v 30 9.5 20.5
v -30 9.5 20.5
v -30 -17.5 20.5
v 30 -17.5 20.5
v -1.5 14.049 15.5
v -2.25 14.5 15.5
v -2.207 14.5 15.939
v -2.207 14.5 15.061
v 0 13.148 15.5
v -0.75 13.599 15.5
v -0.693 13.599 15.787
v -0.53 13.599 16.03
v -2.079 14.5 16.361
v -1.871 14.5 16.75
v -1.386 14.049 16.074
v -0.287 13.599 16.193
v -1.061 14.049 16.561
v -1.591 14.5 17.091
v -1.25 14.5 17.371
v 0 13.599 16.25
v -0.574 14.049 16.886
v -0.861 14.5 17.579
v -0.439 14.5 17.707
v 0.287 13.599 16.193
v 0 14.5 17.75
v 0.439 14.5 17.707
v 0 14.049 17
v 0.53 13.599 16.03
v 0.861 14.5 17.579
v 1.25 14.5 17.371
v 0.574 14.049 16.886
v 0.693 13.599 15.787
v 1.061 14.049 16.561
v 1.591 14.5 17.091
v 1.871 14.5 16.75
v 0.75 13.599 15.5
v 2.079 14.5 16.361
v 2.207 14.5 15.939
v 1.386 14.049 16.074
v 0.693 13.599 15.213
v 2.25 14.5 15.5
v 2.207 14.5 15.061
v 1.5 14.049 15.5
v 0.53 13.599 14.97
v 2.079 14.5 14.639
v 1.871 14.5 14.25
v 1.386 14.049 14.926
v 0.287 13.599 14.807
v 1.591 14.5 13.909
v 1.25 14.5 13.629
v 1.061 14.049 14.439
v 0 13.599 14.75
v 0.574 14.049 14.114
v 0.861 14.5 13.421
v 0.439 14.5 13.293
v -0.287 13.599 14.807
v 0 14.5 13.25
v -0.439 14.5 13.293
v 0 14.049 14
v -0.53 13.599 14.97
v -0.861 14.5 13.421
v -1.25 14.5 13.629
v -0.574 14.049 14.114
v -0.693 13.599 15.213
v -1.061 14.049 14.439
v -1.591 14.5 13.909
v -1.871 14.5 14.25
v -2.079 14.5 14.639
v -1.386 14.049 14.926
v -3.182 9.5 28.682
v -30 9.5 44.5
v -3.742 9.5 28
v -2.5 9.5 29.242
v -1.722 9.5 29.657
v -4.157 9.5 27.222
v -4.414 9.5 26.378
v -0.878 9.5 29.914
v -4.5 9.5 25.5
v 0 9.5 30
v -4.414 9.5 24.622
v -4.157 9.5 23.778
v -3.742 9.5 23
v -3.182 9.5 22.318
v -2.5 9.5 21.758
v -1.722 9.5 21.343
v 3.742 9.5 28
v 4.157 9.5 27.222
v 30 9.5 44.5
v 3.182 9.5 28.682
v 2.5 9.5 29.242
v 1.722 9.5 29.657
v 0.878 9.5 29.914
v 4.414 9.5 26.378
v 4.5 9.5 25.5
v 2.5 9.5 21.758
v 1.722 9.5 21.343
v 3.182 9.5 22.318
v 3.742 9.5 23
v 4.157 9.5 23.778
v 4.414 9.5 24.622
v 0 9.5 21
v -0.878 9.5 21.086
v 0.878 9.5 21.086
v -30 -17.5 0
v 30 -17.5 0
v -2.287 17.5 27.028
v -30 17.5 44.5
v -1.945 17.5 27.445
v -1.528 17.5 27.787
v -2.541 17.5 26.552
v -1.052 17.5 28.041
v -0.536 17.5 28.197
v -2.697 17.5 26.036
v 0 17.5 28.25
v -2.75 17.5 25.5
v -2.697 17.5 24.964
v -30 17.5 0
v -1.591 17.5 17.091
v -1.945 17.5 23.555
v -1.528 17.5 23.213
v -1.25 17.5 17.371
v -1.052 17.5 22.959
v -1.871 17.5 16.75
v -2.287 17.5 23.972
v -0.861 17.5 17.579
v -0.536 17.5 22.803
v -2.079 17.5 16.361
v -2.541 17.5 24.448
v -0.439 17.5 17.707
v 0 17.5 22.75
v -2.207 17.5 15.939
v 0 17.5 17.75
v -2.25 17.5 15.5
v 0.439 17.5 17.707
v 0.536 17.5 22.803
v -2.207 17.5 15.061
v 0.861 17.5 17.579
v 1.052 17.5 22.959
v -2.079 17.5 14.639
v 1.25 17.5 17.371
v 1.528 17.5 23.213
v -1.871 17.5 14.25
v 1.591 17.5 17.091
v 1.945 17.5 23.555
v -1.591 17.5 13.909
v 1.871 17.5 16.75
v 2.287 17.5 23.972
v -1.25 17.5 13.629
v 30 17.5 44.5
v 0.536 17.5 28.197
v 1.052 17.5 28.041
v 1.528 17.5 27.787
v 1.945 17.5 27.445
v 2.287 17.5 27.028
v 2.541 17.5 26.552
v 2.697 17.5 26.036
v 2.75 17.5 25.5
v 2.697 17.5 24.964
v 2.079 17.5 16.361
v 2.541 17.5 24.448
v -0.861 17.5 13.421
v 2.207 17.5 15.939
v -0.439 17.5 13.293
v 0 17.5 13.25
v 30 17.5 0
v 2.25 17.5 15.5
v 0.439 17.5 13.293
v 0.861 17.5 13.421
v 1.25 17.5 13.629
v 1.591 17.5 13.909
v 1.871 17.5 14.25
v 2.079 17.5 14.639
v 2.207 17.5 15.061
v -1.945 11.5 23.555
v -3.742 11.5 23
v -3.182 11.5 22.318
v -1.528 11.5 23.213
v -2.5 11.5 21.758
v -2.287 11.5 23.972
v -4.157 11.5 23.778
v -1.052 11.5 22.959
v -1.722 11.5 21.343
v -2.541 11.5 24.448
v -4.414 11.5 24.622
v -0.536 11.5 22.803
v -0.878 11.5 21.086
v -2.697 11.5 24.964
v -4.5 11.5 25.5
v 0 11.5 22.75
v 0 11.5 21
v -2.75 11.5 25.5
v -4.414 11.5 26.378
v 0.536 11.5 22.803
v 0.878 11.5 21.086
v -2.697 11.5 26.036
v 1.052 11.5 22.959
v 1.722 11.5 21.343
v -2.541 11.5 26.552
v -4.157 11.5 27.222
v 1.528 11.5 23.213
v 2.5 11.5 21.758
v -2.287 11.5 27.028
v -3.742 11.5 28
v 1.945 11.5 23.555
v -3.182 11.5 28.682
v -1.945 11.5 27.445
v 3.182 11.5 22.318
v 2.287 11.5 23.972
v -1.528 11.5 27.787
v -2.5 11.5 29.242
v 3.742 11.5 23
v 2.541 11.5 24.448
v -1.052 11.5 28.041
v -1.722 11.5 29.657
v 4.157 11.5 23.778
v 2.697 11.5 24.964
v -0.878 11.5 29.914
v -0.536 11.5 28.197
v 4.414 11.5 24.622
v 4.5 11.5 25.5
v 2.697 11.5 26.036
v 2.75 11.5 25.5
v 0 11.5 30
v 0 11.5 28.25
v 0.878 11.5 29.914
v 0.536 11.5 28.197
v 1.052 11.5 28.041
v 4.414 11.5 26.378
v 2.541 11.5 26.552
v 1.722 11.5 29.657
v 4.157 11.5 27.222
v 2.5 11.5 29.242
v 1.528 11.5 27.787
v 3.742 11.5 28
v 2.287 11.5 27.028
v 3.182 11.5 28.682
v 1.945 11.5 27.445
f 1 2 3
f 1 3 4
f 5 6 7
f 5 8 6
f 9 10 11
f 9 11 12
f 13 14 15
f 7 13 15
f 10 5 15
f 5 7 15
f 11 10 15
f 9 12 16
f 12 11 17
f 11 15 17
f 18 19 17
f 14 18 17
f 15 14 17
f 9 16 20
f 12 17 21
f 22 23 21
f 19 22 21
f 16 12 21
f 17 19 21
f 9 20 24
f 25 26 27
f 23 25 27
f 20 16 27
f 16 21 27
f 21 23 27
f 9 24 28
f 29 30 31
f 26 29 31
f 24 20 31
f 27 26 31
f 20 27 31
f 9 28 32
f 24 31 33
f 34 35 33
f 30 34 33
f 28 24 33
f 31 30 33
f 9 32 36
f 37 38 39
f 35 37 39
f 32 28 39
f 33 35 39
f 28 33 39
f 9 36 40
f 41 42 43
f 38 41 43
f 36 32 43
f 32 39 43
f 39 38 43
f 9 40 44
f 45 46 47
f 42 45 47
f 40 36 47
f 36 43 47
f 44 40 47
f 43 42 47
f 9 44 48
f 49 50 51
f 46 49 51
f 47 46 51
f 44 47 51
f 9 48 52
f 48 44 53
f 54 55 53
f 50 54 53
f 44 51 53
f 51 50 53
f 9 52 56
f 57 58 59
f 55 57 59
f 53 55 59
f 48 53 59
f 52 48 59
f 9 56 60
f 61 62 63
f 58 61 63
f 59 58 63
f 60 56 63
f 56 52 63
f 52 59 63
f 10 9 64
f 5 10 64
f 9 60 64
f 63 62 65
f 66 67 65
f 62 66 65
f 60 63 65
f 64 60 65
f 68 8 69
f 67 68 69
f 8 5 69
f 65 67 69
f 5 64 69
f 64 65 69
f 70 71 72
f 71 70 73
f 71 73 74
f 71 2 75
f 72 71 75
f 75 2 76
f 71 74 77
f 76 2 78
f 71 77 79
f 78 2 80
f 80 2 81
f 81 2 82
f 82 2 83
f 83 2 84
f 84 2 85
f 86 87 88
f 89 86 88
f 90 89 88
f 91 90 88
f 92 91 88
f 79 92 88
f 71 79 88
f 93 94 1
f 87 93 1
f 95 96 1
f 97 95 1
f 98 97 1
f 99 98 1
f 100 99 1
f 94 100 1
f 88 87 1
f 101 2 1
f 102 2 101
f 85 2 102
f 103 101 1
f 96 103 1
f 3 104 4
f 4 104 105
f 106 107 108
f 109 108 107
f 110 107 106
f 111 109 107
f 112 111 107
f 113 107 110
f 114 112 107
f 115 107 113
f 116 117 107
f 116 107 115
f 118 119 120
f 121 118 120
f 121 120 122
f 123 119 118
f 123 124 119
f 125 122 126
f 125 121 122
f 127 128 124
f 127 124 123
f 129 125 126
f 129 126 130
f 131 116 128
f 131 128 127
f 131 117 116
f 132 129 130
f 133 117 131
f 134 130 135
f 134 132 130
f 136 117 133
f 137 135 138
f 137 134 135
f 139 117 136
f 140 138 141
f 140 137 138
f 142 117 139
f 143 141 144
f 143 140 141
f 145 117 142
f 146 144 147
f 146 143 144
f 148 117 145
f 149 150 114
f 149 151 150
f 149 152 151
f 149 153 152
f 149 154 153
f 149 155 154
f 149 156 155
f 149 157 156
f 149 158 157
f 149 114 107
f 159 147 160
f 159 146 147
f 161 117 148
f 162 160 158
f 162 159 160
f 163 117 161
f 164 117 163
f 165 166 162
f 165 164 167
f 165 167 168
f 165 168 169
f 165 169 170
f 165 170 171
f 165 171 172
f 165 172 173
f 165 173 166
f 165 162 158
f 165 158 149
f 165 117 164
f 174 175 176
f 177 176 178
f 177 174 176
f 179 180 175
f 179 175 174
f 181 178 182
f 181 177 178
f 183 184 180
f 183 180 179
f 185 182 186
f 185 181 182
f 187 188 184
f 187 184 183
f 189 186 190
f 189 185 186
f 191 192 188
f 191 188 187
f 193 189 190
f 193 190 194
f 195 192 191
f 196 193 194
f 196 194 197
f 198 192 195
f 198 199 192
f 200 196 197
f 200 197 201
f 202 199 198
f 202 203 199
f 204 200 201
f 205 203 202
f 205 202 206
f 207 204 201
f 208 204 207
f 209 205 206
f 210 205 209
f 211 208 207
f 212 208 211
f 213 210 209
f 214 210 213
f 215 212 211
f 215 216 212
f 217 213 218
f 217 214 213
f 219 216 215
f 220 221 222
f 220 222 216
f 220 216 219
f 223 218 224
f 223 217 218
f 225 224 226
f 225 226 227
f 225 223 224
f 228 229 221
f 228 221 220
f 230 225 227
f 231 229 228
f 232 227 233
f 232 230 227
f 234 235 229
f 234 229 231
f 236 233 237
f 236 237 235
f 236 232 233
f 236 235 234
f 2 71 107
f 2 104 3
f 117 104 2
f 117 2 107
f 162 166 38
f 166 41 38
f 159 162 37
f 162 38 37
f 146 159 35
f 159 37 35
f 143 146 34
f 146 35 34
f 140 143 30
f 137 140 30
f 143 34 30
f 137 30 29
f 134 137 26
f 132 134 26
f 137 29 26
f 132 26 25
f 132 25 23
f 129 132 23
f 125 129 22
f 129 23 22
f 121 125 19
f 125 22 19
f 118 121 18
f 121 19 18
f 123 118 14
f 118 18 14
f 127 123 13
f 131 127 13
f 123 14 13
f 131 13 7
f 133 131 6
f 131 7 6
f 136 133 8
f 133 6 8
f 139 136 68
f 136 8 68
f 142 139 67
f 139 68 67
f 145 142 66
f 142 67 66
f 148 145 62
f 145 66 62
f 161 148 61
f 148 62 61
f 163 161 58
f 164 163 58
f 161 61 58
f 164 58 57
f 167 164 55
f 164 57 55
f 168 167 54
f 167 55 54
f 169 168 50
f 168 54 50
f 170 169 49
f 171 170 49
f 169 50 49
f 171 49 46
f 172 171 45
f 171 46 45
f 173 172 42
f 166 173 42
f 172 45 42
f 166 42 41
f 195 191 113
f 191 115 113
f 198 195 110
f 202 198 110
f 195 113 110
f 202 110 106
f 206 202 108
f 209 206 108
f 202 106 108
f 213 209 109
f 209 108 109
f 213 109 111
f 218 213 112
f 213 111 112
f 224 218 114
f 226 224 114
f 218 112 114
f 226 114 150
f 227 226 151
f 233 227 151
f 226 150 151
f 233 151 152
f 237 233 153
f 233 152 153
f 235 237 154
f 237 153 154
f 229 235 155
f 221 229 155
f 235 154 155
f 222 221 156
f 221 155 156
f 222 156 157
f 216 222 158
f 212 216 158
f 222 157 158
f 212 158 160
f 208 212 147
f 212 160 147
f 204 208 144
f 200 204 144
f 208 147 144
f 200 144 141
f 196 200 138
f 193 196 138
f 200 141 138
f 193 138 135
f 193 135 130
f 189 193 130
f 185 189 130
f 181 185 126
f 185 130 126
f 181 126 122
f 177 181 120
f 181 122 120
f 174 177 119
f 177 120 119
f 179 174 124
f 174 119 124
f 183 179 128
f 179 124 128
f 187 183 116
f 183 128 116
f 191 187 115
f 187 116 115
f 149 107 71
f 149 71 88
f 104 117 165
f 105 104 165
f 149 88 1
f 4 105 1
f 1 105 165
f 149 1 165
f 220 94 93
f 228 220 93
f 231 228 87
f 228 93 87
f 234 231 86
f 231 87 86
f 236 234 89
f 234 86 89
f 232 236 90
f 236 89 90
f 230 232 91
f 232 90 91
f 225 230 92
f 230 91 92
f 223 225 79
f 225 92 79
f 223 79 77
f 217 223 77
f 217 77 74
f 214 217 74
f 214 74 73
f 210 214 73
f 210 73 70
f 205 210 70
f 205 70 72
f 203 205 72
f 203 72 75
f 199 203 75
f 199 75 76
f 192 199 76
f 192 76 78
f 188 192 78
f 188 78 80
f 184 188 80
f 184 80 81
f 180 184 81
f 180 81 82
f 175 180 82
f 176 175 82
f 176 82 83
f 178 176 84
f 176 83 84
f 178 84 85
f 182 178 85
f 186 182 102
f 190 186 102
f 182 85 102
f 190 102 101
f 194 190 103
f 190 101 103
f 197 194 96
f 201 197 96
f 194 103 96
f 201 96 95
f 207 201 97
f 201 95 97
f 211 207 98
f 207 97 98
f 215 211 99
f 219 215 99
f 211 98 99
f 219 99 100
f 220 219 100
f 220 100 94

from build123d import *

# Parameters (mm, degrees)
F0_W           = 60
F0_H           = 35
F1_DEPTH       = 20.5
F2_W           = 60
F2_H           = 8
F3_DEPTH       = 24
F5_D           = 5.5
F5_CBORE_D     = 9
F5_CBORE_DEPTH = 2
F7_D           = 4.5
F7_DEPTH       = 3
F7_TIP         = 1.3519363928


with BuildPart() as f1:
    # F0 (on Top) → F1 (new body)
    with BuildSketch(Plane.XY):
        Rectangle(F0_W, F0_H)
    extrude(amount=F1_DEPTH)

    # F2 (on face) → F3 (join)
    with BuildSketch(Plane.XY.offset(20.5)):
        with Locations((0, 13.5)):
            Rectangle(F2_W, F2_H)
    extrude(amount=F3_DEPTH)

    # F5 (through all)
    with Locations(Plane.XZ.offset(-9.5)):
        with Locations((0, 25.5)):
            CounterBoreHole(F5_D / 2, F5_CBORE_D / 2, F5_CBORE_DEPTH)

    # F7
    with Locations(Plane(origin=(0, 17.5, 0), x_dir=(-1, 0, 0), z_dir=(0, 1, 0))):
        with Locations((0, 15.5)):
            Hole(F7_D / 2, depth=F7_DEPTH)
            with Locations((0, 0, -(F7_DEPTH + F7_TIP / 2))):  # 118° drill point
                Cone(0, F7_D / 2, F7_TIP, mode=Mode.SUBTRACT)


solid = f1.part
